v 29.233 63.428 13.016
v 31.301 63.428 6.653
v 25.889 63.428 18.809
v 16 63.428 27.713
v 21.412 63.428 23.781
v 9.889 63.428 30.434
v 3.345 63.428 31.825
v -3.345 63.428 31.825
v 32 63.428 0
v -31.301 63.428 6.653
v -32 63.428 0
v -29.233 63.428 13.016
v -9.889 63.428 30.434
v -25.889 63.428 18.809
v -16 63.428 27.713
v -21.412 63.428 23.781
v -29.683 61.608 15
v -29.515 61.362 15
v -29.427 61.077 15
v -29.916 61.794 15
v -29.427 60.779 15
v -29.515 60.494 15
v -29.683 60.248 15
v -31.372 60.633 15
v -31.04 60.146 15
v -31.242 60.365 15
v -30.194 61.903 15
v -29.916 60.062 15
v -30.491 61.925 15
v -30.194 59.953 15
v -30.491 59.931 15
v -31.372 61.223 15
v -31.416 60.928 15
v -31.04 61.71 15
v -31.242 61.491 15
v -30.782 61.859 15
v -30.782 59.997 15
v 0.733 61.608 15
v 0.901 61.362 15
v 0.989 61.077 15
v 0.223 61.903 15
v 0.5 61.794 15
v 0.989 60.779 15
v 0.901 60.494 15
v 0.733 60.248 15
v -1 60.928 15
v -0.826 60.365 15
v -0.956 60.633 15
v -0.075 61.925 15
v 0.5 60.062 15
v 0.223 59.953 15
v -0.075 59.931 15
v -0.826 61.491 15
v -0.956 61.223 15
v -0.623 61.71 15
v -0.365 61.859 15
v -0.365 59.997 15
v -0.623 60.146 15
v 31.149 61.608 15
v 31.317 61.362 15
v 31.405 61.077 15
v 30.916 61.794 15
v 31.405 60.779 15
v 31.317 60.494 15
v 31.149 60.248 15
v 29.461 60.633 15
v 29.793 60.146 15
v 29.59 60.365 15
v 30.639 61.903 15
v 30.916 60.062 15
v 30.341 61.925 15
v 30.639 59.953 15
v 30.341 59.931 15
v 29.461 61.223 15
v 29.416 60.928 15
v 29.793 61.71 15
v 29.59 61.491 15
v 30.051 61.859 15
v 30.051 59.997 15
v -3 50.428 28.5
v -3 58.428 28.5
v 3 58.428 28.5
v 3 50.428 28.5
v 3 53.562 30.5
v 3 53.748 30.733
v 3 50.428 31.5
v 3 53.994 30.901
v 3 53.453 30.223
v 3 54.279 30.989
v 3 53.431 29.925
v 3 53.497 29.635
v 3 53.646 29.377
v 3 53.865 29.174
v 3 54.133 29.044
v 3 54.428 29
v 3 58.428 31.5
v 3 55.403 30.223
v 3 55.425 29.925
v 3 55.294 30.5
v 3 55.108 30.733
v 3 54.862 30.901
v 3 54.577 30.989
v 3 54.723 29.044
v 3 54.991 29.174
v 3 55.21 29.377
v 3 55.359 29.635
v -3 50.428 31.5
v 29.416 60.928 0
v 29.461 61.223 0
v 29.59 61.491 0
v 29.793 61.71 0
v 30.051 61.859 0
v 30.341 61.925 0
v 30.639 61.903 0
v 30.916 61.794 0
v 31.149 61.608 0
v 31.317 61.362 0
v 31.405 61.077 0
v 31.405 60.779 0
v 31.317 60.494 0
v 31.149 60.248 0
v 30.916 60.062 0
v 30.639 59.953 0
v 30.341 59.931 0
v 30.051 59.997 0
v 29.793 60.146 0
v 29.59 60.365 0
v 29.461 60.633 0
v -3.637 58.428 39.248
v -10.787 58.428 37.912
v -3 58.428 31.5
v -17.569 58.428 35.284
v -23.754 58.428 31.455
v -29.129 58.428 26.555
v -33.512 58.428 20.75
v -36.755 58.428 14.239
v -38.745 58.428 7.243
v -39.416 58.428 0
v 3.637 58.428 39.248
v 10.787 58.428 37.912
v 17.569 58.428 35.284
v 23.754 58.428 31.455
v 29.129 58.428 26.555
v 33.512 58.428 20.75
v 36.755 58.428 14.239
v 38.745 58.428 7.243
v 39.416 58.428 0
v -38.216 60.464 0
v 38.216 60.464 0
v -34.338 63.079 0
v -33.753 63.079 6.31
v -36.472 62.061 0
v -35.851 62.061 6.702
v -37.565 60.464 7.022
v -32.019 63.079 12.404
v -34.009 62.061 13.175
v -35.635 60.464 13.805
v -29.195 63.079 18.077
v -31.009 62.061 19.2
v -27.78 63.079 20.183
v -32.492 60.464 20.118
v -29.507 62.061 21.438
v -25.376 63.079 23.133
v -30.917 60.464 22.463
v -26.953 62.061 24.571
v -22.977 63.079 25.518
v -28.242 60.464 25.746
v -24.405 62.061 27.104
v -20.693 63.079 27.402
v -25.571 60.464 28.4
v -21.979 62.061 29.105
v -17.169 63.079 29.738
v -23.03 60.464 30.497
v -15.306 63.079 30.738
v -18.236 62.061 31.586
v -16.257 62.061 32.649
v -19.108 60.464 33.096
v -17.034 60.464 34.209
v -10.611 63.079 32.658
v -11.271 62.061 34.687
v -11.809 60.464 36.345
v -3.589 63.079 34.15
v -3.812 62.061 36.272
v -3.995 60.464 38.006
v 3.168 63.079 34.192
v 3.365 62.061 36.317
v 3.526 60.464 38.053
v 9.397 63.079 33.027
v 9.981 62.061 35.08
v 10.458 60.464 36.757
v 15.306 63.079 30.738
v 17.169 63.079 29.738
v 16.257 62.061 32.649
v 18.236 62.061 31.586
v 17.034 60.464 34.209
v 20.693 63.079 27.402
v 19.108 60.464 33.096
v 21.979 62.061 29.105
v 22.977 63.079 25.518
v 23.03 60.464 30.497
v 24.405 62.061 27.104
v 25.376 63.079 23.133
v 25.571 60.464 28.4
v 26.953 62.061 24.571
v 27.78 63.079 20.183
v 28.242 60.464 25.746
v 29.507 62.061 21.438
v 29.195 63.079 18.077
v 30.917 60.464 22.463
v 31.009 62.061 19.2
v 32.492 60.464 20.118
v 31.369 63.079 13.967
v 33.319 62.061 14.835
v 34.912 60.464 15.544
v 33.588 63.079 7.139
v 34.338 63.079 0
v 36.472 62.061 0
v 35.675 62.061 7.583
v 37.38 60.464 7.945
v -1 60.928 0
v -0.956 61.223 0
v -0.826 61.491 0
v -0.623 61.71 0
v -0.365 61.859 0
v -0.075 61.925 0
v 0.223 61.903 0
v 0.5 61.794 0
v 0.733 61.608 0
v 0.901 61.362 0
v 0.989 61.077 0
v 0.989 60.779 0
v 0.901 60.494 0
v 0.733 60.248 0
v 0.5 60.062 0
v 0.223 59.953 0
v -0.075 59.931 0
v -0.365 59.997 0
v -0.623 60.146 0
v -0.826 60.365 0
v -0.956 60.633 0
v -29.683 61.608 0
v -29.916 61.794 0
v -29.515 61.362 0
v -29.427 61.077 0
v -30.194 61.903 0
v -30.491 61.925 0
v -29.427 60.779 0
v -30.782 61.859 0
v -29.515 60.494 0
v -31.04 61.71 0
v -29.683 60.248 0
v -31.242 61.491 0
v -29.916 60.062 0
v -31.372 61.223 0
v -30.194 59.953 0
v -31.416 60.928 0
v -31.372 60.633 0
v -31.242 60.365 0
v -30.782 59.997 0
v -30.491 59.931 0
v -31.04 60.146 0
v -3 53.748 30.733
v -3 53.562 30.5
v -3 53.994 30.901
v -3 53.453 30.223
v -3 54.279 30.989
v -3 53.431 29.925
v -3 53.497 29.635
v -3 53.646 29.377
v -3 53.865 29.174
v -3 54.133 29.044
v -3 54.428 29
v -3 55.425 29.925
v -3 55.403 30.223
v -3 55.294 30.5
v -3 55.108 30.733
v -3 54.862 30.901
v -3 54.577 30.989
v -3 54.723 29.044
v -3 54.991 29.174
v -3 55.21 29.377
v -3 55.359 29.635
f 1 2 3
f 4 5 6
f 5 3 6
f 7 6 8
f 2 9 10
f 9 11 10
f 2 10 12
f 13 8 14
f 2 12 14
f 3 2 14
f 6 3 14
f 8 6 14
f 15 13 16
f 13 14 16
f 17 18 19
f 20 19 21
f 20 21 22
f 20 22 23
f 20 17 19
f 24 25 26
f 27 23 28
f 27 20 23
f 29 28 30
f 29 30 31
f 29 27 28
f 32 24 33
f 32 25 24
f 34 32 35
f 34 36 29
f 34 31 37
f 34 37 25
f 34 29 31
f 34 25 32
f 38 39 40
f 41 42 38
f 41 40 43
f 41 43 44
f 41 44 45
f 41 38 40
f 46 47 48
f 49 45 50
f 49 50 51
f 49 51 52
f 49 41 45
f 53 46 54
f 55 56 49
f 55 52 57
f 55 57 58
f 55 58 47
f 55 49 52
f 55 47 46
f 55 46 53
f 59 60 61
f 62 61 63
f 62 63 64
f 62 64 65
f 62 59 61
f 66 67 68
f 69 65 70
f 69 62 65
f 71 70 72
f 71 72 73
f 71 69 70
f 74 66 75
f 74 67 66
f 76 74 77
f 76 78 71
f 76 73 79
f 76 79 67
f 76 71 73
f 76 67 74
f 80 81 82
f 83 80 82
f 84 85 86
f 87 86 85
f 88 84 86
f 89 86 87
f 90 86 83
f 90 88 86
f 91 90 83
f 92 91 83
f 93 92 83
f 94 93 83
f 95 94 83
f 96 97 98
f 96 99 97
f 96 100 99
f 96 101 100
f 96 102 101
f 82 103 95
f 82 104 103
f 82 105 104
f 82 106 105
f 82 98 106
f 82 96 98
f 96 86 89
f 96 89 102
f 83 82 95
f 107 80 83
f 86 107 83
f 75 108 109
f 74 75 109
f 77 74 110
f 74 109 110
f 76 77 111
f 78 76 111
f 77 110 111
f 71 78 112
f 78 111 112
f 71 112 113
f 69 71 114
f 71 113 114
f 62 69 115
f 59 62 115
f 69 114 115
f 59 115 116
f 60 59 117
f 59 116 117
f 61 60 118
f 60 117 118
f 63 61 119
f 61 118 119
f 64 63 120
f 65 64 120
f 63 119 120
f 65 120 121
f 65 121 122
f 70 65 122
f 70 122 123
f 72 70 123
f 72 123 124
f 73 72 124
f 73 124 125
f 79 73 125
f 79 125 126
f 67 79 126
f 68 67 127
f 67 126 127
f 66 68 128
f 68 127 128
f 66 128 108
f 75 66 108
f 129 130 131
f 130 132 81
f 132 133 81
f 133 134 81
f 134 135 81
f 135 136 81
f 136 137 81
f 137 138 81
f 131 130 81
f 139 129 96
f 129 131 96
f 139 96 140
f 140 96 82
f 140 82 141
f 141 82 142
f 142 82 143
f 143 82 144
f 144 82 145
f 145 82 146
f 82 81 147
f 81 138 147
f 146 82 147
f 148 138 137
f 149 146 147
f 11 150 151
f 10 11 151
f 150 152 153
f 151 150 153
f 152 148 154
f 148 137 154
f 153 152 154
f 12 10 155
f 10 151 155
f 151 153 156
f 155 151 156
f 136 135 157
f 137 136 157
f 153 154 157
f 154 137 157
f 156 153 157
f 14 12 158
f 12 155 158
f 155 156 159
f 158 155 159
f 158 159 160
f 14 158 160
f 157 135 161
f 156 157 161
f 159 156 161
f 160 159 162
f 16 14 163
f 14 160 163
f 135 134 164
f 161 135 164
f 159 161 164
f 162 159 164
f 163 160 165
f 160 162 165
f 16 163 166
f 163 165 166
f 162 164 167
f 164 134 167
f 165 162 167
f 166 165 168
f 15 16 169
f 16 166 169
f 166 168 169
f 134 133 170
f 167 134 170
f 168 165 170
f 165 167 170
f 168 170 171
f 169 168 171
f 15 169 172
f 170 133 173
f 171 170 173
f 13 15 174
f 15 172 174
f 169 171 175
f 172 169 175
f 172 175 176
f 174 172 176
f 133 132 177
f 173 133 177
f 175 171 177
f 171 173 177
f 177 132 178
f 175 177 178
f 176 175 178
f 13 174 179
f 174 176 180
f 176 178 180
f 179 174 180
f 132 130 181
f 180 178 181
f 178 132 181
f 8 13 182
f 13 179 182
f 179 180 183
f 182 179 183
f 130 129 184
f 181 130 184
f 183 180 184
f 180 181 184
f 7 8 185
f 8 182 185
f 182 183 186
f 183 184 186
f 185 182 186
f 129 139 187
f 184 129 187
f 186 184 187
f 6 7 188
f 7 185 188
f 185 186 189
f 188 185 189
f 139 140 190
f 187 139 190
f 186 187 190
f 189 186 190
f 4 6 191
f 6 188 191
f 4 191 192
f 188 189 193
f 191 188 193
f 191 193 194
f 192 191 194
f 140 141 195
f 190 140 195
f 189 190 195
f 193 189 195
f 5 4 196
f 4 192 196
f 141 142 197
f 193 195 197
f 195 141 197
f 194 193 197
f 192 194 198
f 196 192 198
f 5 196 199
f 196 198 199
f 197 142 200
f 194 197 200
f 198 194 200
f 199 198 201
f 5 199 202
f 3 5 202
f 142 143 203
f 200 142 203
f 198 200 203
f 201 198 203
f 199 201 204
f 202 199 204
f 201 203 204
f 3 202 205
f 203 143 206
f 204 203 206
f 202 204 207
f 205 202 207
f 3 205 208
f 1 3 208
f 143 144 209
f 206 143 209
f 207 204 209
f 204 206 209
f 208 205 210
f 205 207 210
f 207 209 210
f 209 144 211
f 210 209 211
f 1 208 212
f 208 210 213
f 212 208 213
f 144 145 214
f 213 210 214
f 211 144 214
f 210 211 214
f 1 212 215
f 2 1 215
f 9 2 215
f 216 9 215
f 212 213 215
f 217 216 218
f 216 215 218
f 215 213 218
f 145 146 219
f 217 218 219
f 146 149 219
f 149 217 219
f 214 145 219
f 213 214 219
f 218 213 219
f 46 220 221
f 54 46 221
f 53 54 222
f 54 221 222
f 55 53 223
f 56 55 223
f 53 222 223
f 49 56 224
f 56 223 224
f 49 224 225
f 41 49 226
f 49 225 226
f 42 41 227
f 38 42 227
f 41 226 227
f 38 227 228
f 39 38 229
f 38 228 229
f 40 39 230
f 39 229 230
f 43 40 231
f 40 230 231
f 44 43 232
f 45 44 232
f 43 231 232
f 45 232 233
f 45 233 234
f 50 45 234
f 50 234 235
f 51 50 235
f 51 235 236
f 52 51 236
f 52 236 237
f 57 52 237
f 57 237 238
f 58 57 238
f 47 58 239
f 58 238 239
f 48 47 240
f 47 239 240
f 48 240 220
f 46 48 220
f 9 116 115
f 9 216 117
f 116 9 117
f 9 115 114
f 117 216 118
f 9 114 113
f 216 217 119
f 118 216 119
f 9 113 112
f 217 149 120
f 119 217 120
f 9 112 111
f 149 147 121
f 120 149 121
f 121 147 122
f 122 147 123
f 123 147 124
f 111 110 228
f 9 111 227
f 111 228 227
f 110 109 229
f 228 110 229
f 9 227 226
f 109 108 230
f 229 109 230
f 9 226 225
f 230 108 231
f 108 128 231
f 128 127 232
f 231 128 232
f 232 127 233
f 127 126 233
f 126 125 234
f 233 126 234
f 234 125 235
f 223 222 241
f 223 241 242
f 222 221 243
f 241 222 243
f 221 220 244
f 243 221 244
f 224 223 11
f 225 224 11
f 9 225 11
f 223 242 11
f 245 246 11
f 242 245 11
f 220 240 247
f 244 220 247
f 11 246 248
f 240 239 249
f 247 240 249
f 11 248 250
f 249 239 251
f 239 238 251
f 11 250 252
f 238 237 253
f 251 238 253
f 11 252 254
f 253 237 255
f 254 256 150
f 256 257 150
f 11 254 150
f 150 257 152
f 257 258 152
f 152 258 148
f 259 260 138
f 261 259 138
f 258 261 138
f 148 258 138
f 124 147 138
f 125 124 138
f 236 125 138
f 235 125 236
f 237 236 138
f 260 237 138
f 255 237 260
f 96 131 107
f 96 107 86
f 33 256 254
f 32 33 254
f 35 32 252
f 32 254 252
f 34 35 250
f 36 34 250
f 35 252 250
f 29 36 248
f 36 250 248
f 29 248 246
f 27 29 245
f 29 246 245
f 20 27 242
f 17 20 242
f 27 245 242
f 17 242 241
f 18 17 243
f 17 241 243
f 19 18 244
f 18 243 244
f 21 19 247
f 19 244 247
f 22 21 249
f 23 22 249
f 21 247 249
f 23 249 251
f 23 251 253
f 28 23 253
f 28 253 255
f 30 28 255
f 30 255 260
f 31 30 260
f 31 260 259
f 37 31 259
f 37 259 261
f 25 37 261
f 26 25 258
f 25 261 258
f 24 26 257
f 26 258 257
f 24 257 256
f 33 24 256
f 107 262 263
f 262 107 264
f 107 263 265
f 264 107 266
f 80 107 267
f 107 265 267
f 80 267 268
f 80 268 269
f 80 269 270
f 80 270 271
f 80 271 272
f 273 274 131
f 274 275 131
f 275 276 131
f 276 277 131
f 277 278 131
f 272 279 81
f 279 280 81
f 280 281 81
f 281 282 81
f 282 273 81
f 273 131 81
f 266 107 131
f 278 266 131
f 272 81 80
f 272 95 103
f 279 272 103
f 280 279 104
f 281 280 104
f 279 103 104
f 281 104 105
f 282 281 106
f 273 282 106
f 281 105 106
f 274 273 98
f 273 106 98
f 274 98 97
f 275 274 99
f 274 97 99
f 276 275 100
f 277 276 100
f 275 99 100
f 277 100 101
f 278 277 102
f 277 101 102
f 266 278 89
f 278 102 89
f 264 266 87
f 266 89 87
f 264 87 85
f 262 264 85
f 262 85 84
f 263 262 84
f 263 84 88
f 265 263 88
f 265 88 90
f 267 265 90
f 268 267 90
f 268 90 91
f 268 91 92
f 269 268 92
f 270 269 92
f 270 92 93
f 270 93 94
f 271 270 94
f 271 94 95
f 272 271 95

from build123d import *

# Parameters (mm, degrees)
CUT_EXTRUDE3_DEPTH           = 60
CUT_EXTRUDE5_DEPTH           = 2
CUT_EXTRUDE5_DEPTH_BACK      = 30
SKETCH9_R                    = 38
SKETCH9_R_2                  = 23
SKETCH19_W                   = 12
SKETCH19_H                   = 36.5
CUT_REVOLVE2_ANGLE           = 65
CUT_REVOLVE2_OTHER_WAY_ANGLE = 65
SKETCH21_W                   = 3.25
SKETCH21_H                   = 4
BOSS_EXTRUDE3_DEPTH          = 1.35
CIRPATTERN1_COUNT            = 5
CUT_EXTRUDE9_START           = -5
CUT_EXTRUDE9_DEPTH           = 5
SKETCH23_R                   = 10.5
CUT_EXTRUDE10_DEPTH          = 10
SKETCH24_W                   = 15
SKETCH24_H                   = 8
BOSS_EXTRUDE4_DEPTH          = 8
SKETCH26_W                   = 10
SKETCH26_H                   = 6
CUT_EXTRUDE11_DEPTH          = 10
SKETCH27_W                   = 4
SKETCH27_H                   = 5
CUT_EXTRUDE12_DEPTH          = 5
CUT_EXTRUDE14_DEPTH          = 2
CUT_EXTRUDE14_DEPTH_BACK     = 30
SKETCH29_R                   = 1
CUT_EXTRUDE15_DEPTH          = 15
FILLET1_R                    = 6
FILLET2_R                    = 8
INTERSECT1_DEPTH             = 58.427876097
SKETCH31_W                   = 6
SKETCH31_H                   = 3
BOSS_EXTRUDE7_DEPTH          = 8
SKETCH32_R                   = 1
CUT_EXTRUDE16_DEPTH          = 7.5


# Read off the part's stored shape, not the designer's step: Cut-Extrude9, Intersect1
with BuildPart() as part:
    # Sketch1 → Revolve1 (revolve)
    with BuildSketch(Plane.XY, mode=Mode.PRIVATE) as revolve1_sk:
        with BuildLine():
            Line((0, 63.427876097), (32, 63.427876097))
            ThreePointArc((32, 63.427876097), (37.656854249, 61.084730346), (40, 55.427876097))
            Line((40, 55.427876097), (40, 28.846818009))
            ThreePointArc((40, 28.846818009), (38.792081772, 24.082439968), (35.460140376, 20.469057744))
            Line((35.460140376, 20.469057744), (28.539859624, 15.958818353))
            ThreePointArc((28.539859624, 15.958818353), (25.207918228, 12.345436129), (24, 7.581058088))
            Line((24, 7.581058088), (24, 3.25))
            Line((24, 3.25), (24.35, 3))
            Line((24.35, 3), (24.35, 0))
            Line((24.35, 0), (22.5, 0))
            Line((22.5, 0), (22.5, 12.5))
            ThreePointArc((22.5, 12.5), (22.353553391, 12.853553391), (22, 13))
            Line((22, 13), (0, 13))
            Line((0, 13), (0, 63.427876097))
        make_face()
    revolve(revolve1_sk.sketch.rotate(Axis((0, 0, 0), (0, 1, 0)), 90), axis=Axis((0, 0, 0), (0, 1, 0)))

    # Sketch11 → Cut-Extrude3 (cut)
    with BuildSketch(Plane(origin=(0, 13, 0), x_dir=(-1, 0, 0), z_dir=(0, -1, 0))):
        with BuildLine():
            Line((-21, 0), (21, 0))
            ThreePointArc((21, 0), (0, 21), (-21, 0))
        make_face()
    extrude(amount=-CUT_EXTRUDE3_DEPTH, mode=Mode.SUBTRACT)

    # Sketch9 → Cut-Extrude5 (cut, two sides: drawn at the far end of the back side and taken through both)
    with BuildSketch(Plane(origin=(0, 55.427876097, 0), x_dir=(1, 0, 0), z_dir=(0, 1, 0)).offset(-CUT_EXTRUDE5_DEPTH_BACK)):
        with Locations(Location((0, 0, 0), (0, 0, 270))):
            Circle(SKETCH9_R)
        with Locations(Location((0, 0, 0), (0, 0, 270))):
            Circle(SKETCH9_R_2, mode=Mode.SUBTRACT)
    extrude(amount=CUT_EXTRUDE5_DEPTH + CUT_EXTRUDE5_DEPTH_BACK, mode=Mode.SUBTRACT)

    # Sketch19 → Cut-Revolve2 (revolve, cut)
    with BuildSketch(Plane(origin=(0, 0, 0), x_dir=(0, 0, -1), z_dir=(1, 0, 0))):
        with Locations((-41.064715832, 37.177876097)):
            Rectangle(SKETCH19_W, SKETCH19_H)
    revolve(axis=Axis((0, 0, 0), (0, 1, 0)), revolution_arc=CUT_REVOLVE2_ANGLE, mode=Mode.SUBTRACT)

    # Sketch19 → Cut-Revolve2 other way (revolve, cut)
    with BuildSketch(Plane(origin=(0, 0, 0), x_dir=(0, 0, -1), z_dir=(1, 0, 0))):
        with Locations((-41.064715832, 37.177876097)):
            Rectangle(SKETCH19_W, SKETCH19_H)
    revolve(axis=Axis((0, 0, 0), (0, -1, 0)), revolution_arc=CUT_REVOLVE2_OTHER_WAY_ANGLE, mode=Mode.SUBTRACT)

    # Sketch21 → Boss-Extrude3 (add)
    with BuildSketch(Plane(origin=(0, 0, 22.5), x_dir=(-1, 0, 0), z_dir=(0, 0, -1))):
        with Locations((0, 2)):
            Rectangle(SKETCH21_W, SKETCH21_H)
    boss_extrude3 = extrude(amount=BOSS_EXTRUDE3_DEPTH)

    # CirPattern1: Boss-Extrude3 ×5 about axis
    cirpattern1_axis = Axis((0, 0, 0), (0, 1, 0))
    for i in range(1, CIRPATTERN1_COUNT):
        add(boss_extrude3.rotate(cirpattern1_axis, i * 360 / CIRPATTERN1_COUNT))

    # Cut-Extrude9 outline → Cut-Extrude9 (cut)
    with BuildSketch(Plane(origin=(0, 63.427876097, 0), x_dir=(1, 0, 0), z_dir=(0, 1, 0)).offset(CUT_EXTRUDE9_START)):
        with BuildLine():
            ThreePointArc((40, 0), (0, 40), (-40, 0))
            Line((-40, 0), (-21, 0))
            ThreePointArc((-21, 0), (0, 21), (21, 0))
            Line((21, 0), (40, 0))
        make_face()
    extrude(amount=CUT_EXTRUDE9_DEPTH, mode=Mode.SUBTRACT)

    # Sketch23 → Cut-Extrude10 (cut)
    with BuildSketch(Plane(origin=(0, 0, -40), x_dir=(-1, 0, 0), z_dir=(0, 0, -1))):
        with Locations((0, 42.137876097)):
            Circle(SKETCH23_R)
    extrude(amount=-CUT_EXTRUDE10_DEPTH, mode=Mode.SUBTRACT)

    # Sketch24 → Boss-Extrude4 (add)
    with BuildSketch(Plane(origin=(0, 58.427876097, 0), x_dir=(1, 0, 0), z_dir=(0, 1, 0))):
        with Locations((0, 30)):
            Rectangle(SKETCH24_W, SKETCH24_H)
    extrude(amount=-BOSS_EXTRUDE4_DEPTH)

    # Sketch26 → Cut-Extrude11 (cut)
    with BuildSketch(Plane(origin=(0, 58.427876097, 0), x_dir=(1, 0, 0), z_dir=(0, 1, 0))):
        with Locations((0, 30)):
            Rectangle(SKETCH26_W, SKETCH26_H)
    extrude(amount=-CUT_EXTRUDE11_DEPTH, mode=Mode.SUBTRACT)

    # Sketch27 → Cut-Extrude12 (cut)
    with BuildSketch(Plane(origin=(7.5, 0, 0), x_dir=(0, 0, -1), z_dir=(1, 0, 0))):
        with Locations((30, 53.927876097)):
            Rectangle(SKETCH27_W, SKETCH27_H)
    extrude(amount=-CUT_EXTRUDE12_DEPTH, mode=Mode.SUBTRACT)

    # Sketch28 → Cut-Extrude14 (cut, two sides: drawn at the far end of the back side and taken through both)
    with BuildSketch(Plane(origin=(0, 55.427876097, 0), x_dir=(1, 0, 0), z_dir=(0, 1, 0)).offset(-CUT_EXTRUDE14_DEPTH_BACK)):
        with BuildLine():
            Line((-22.912878475, -2), (22.912878475, -2))
            ThreePointArc((22.912878475, -2), (0, -23), (-22.912878475, -2))
        make_face()
    extrude(amount=CUT_EXTRUDE14_DEPTH + CUT_EXTRUDE14_DEPTH_BACK, mode=Mode.SUBTRACT)

    # Sketch29 → Cut-Extrude15 (cut)
    with BuildSketch(Plane(origin=(0, 0, 0), x_dir=(-1, 0, 0), z_dir=(0, 0, -1))):
        with Locations((-30.416198487, 60.927876097)):
            Circle(SKETCH29_R)
        with Locations((30.416198487, 60.927876097)):
            Circle(SKETCH29_R)
        with Locations((0, 60.927876097)):
            Circle(SKETCH29_R)
    extrude(amount=-CUT_EXTRUDE15_DEPTH, mode=Mode.SUBTRACT)

    # Fillet1
    fillet1_edges = [part.edges().sort_by_distance(p)[0] for p in [
        (21, 35.713938048, 0),
        (-21, 35.713938048, 0),
    ]]
    fillet(fillet1_edges, radius=FILLET1_R)

    # Fillet2
    fillet2_edges = [part.edges().sort_by_distance(p)[0] for p in [
        (-22.912878475, 41.427876097, 2),
        (22.912878475, 41.427876097, 2),
    ]]
    fillet(fillet2_edges, radius=FILLET2_R)

    # Intersect1 outline → Intersect1 (cut)
    with BuildSketch(Plane(origin=(0, 0, 0), x_dir=(1, 0, 0), z_dir=(0, 1, 0))):
        with BuildLine():
            Line((-37.508702776, -13.895942431), (-42, -15.355253362))
            Line((-42, -15.355253362), (-42, -41))
            Line((-42, -41), (42, -41))
            Line((42, -41), (42, -15.355253362))
            Line((42, -15.355253362), (37.508702776, -13.895942431))
            ThreePointArc((37.508702776, -13.895942431), (0, 40), (-37.508702776, -13.895942431))
        make_face()
        with BuildLine():
            ThreePointArc((19.246817919, 8.4), (18.767687244, 2.713664655), (13.747727085, 0))
            Line((13.747727085, 0), (-13.747727085, 0))
            ThreePointArc((-13.747727085, 0), (-18.767687244, 2.713664655), (-19.246817919, 8.4))
            ThreePointArc((-19.246817919, 8.4), (0, 21), (19.246817919, 8.4))
        make_face(mode=Mode.SUBTRACT)
    extrude(amount=INTERSECT1_DEPTH, mode=Mode.SUBTRACT)

    # Sketch31 → Boss-Extrude7 (add)
    with BuildSketch(Plane(origin=(0, 58.427876097, 0), x_dir=(1, 0, 0), z_dir=(0, 1, 0))):
        with Locations((0, -30)):
            Rectangle(SKETCH31_W, SKETCH31_H)
    extrude(amount=-BOSS_EXTRUDE7_DEPTH)

    # Sketch32 → Cut-Extrude16 (cut)
    with BuildSketch(Plane(origin=(3, 0, 0), x_dir=(0, 0, -1), z_dir=(1, 0, 0))):
        with Locations((-30, 54.427876097)):
            Circle(SKETCH32_R)
    extrude(amount=-CUT_EXTRUDE16_DEPTH, mode=Mode.SUBTRACT)


solid = part.part
